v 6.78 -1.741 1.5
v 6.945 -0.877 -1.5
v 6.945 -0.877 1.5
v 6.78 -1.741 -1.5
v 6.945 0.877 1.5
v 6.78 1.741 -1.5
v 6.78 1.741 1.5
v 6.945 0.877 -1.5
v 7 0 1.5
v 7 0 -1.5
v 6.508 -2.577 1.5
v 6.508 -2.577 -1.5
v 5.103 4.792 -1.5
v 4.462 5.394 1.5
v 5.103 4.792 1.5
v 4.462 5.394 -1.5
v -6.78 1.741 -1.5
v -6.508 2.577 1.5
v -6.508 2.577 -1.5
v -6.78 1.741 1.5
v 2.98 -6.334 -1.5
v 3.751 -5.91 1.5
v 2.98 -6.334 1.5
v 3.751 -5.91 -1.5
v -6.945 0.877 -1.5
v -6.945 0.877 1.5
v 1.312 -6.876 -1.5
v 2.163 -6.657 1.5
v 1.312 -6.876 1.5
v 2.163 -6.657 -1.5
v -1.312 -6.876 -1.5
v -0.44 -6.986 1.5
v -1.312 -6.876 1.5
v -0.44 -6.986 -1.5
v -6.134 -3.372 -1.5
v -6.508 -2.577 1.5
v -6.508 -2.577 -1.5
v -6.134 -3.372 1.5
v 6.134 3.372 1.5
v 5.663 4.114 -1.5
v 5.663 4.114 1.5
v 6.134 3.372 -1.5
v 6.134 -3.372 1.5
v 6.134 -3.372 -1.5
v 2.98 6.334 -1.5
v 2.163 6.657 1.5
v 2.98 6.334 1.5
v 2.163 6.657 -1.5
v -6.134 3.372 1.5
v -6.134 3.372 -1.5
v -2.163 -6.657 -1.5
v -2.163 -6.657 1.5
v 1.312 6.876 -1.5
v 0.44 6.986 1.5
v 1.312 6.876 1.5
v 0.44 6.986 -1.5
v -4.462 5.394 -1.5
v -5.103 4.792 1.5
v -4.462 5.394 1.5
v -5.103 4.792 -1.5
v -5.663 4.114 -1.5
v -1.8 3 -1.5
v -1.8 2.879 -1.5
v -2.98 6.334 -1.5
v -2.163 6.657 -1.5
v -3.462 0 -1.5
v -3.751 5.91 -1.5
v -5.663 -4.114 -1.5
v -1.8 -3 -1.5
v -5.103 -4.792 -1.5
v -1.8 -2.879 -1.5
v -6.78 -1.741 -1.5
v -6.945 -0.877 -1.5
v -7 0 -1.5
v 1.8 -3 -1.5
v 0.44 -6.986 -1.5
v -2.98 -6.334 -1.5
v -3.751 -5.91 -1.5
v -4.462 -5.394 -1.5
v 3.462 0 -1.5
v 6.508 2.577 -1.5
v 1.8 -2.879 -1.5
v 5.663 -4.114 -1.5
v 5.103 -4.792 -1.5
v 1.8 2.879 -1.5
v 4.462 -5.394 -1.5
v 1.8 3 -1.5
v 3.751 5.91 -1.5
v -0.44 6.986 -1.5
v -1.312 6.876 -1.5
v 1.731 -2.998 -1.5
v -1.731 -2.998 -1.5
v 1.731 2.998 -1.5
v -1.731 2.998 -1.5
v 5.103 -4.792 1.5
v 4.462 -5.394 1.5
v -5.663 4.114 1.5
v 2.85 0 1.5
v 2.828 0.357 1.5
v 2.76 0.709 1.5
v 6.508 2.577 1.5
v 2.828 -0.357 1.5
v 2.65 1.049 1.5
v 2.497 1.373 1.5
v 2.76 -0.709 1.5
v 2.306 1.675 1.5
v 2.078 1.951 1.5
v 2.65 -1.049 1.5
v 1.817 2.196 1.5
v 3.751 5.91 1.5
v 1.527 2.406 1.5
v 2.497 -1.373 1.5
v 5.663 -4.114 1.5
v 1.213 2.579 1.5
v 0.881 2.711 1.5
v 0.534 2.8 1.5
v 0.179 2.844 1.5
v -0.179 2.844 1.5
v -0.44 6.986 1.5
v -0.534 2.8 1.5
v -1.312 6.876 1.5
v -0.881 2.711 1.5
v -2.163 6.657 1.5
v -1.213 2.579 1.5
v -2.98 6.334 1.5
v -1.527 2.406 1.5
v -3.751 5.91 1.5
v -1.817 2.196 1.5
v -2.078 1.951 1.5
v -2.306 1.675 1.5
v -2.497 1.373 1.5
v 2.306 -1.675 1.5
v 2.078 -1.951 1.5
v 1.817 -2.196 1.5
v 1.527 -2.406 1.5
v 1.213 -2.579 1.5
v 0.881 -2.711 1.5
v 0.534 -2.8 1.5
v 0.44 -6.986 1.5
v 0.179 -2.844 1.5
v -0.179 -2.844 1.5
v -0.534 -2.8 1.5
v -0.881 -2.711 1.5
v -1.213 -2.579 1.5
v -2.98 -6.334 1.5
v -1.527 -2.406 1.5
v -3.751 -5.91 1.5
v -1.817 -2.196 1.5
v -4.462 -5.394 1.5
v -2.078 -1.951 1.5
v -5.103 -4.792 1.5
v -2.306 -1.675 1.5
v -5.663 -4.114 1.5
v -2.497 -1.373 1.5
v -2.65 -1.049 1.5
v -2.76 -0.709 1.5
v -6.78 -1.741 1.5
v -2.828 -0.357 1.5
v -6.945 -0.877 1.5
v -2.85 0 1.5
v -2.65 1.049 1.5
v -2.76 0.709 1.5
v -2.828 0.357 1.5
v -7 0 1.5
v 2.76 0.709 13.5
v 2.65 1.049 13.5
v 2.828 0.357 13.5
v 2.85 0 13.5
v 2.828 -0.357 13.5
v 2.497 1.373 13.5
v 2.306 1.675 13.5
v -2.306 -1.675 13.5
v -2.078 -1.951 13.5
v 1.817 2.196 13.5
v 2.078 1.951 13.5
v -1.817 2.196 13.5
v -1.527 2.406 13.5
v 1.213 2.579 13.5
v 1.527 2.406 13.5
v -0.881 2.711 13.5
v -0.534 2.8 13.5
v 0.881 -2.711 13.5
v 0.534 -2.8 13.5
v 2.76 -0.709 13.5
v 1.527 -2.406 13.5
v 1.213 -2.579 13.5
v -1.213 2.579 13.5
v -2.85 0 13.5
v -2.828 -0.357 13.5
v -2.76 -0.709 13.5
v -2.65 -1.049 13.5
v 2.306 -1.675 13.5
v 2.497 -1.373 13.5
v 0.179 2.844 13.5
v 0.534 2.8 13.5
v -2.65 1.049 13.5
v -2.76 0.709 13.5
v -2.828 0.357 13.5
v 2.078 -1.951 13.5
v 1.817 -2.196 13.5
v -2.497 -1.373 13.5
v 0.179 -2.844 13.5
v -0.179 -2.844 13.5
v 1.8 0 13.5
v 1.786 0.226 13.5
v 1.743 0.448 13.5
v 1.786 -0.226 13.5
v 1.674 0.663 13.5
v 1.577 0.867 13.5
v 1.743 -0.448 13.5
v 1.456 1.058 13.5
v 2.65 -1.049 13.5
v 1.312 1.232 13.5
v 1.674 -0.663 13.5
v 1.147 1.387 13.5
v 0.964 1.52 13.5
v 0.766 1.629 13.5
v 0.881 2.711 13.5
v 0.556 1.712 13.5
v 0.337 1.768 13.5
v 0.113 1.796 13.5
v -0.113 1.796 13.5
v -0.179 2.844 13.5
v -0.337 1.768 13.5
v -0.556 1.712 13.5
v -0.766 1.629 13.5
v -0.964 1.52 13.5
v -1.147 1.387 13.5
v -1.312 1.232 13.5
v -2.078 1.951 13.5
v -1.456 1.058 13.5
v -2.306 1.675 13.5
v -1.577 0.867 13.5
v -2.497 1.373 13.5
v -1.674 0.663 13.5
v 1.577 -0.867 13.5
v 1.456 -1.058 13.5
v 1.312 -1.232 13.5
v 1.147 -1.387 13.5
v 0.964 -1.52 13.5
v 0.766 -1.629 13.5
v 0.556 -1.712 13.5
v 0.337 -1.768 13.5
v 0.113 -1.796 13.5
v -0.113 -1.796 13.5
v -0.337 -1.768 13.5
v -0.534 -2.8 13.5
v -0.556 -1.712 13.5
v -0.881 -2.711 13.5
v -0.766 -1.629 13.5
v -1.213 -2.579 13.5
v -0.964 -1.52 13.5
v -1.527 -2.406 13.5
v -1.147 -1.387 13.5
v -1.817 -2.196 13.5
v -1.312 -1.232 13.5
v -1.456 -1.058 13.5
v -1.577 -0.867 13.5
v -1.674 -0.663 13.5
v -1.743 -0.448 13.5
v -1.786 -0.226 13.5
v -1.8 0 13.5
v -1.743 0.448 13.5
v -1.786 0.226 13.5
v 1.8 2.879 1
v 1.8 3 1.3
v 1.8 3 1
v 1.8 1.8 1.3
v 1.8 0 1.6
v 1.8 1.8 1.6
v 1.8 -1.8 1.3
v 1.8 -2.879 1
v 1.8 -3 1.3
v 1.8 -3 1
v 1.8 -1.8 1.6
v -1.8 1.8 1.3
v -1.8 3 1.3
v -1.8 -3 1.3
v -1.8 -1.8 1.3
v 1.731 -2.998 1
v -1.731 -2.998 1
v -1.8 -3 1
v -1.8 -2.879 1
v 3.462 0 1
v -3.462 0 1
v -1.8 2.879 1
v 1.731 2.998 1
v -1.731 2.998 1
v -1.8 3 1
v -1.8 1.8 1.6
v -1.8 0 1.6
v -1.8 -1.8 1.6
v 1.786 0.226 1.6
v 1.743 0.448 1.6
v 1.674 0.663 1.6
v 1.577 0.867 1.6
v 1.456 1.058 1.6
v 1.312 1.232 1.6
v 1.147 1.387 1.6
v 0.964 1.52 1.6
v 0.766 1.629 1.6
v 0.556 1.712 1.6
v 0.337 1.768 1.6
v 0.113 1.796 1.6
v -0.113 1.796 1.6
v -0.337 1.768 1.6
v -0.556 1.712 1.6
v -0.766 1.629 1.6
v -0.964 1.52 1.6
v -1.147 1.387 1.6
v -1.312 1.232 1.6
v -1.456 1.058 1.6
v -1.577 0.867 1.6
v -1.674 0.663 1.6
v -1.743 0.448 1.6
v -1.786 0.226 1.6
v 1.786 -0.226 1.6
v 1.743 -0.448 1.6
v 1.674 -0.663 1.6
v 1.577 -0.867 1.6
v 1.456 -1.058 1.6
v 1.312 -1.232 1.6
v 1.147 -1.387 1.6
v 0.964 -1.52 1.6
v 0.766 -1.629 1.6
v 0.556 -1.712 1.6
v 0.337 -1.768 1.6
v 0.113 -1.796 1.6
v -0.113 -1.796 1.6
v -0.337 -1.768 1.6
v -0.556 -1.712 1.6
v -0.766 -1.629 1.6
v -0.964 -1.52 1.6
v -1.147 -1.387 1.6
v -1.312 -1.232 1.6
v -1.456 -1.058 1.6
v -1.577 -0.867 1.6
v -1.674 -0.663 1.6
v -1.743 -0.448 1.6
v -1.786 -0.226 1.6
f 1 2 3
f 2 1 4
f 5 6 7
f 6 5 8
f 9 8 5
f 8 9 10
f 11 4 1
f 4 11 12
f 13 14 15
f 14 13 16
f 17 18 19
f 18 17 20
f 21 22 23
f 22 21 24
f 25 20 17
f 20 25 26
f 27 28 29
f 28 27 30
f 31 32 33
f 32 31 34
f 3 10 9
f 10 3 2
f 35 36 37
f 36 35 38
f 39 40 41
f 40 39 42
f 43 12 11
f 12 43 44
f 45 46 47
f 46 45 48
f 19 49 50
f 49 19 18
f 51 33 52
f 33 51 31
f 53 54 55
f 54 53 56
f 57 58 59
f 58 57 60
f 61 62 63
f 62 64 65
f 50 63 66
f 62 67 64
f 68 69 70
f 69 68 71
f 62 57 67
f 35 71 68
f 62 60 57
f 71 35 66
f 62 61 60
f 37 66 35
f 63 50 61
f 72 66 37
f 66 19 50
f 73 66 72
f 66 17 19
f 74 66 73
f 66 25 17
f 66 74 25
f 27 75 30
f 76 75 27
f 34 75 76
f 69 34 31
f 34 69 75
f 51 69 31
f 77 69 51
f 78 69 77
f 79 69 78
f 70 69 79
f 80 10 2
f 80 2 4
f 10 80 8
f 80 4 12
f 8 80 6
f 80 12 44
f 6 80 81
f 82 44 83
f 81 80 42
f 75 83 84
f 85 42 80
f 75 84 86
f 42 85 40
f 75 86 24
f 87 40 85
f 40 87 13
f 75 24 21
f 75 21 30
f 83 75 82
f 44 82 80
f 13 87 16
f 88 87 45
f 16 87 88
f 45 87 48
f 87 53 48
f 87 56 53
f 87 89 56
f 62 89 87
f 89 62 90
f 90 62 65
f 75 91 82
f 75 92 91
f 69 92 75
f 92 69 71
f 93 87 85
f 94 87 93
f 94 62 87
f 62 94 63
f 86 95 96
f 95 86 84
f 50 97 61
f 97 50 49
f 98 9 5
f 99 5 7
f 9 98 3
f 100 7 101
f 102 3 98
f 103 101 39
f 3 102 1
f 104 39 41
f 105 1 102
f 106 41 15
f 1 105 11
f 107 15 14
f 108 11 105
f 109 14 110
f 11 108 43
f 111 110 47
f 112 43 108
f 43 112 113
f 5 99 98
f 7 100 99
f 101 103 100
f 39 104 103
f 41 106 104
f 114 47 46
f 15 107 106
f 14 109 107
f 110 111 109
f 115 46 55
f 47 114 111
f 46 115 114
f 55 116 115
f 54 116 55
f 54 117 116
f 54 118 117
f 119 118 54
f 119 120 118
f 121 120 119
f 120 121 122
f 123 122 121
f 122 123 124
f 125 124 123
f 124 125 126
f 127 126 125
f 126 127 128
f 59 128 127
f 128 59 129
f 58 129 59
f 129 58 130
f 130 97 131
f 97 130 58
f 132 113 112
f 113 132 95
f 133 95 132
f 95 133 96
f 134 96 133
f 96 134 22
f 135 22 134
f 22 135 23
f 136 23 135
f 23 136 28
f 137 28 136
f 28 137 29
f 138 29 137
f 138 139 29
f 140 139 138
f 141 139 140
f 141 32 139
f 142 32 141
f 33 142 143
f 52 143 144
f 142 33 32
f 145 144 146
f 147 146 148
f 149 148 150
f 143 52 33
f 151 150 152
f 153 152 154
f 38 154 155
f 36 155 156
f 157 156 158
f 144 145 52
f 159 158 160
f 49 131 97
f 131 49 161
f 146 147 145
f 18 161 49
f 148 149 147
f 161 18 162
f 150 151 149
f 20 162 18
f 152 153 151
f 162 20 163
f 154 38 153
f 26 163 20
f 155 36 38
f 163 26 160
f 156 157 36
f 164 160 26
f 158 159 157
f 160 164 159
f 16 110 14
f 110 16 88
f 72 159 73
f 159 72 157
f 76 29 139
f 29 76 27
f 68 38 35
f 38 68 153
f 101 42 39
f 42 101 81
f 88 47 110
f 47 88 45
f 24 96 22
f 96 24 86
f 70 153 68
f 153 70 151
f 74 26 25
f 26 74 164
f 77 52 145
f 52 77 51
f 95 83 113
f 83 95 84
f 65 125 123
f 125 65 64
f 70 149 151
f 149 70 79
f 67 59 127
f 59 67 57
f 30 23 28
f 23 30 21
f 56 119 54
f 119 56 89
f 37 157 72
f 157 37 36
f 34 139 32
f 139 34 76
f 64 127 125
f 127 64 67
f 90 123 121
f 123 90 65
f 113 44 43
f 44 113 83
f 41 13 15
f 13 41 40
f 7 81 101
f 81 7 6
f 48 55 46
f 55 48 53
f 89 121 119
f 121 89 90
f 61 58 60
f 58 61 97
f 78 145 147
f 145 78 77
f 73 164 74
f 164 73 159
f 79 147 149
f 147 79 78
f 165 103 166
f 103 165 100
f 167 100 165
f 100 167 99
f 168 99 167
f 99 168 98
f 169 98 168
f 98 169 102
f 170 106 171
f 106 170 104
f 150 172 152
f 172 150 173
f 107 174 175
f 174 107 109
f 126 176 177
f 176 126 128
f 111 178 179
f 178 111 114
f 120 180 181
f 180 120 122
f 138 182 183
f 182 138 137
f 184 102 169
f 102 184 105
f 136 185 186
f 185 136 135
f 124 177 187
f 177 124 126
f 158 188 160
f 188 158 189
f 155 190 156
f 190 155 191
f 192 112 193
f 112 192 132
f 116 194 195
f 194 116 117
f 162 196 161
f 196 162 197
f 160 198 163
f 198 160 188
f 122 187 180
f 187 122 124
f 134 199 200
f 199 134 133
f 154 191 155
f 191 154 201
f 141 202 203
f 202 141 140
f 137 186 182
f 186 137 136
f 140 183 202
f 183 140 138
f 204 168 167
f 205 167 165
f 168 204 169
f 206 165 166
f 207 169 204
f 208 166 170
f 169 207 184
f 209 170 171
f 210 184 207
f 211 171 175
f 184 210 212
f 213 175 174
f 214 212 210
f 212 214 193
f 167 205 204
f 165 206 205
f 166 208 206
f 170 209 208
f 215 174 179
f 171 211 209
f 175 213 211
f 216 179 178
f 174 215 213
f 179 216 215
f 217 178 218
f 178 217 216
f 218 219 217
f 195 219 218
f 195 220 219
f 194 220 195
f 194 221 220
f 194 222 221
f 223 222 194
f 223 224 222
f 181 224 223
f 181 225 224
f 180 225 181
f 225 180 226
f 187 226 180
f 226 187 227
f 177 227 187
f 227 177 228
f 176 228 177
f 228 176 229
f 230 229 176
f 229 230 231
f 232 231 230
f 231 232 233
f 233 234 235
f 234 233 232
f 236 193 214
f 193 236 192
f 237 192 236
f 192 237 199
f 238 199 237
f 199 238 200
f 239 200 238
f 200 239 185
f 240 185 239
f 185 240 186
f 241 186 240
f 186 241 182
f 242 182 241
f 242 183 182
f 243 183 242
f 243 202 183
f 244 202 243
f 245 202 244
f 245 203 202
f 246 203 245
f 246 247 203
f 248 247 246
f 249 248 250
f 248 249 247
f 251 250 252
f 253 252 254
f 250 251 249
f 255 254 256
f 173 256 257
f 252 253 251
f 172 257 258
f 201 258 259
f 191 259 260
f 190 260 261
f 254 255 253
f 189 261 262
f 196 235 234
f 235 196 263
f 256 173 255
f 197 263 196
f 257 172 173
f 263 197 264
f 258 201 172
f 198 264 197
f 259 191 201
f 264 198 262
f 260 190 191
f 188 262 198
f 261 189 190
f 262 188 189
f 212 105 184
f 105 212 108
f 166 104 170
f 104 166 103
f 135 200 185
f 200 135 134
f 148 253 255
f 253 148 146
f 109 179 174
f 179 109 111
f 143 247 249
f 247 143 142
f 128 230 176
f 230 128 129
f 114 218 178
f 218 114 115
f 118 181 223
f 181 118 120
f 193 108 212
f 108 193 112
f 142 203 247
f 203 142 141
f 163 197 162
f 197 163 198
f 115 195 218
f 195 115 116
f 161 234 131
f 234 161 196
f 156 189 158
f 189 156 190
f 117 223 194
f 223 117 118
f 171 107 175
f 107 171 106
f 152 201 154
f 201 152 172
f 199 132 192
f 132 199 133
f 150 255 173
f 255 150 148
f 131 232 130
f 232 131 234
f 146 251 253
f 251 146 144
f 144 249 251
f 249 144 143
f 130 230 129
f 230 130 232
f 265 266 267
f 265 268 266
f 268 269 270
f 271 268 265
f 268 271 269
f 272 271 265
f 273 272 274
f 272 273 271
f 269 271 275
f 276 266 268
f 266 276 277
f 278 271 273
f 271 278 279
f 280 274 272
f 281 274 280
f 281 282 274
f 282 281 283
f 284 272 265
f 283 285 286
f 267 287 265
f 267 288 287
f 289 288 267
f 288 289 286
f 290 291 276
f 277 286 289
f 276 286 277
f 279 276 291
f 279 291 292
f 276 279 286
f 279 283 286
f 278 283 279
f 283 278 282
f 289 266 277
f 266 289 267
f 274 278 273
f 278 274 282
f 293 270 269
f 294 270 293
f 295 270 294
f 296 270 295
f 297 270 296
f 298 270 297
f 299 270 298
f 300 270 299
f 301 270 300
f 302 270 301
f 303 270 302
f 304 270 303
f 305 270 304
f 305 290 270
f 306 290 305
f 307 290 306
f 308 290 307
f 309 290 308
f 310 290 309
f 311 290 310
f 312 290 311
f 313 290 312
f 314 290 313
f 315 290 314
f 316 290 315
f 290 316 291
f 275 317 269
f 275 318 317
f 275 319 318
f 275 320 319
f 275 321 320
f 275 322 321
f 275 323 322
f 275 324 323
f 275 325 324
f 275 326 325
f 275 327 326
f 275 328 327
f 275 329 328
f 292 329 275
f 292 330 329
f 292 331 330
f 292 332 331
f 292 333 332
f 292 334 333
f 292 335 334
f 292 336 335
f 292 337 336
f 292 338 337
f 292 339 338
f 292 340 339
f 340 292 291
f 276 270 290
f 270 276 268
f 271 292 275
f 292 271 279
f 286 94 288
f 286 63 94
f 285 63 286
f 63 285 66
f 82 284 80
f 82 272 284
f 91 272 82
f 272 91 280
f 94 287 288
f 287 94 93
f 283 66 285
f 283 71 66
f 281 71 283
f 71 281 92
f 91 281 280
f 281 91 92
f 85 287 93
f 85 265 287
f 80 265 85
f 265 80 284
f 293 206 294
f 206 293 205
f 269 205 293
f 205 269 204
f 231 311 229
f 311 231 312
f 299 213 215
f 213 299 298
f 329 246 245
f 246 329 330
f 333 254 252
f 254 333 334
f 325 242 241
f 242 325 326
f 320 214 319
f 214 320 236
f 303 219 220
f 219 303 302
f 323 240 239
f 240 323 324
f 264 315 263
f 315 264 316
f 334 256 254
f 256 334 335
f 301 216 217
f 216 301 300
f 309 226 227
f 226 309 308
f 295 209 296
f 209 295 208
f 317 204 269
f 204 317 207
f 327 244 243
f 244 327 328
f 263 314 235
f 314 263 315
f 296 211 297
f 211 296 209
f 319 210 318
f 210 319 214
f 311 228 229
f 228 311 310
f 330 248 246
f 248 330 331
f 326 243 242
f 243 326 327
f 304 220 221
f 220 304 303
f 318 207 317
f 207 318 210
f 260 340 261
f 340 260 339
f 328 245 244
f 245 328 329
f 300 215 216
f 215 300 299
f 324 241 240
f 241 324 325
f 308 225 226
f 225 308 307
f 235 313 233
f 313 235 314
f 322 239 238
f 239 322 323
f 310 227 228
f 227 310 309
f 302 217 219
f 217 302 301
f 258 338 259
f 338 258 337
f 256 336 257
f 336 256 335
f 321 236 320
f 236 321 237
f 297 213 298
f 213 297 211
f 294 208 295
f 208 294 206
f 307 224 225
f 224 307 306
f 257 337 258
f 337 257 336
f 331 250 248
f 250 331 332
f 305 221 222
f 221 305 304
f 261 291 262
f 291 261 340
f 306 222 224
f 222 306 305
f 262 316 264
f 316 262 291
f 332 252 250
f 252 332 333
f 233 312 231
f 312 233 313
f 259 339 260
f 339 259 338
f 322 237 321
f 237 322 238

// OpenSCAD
$fn = 50;


difference() {
	union() {
		translate(v = [0, 0, -1.5000000000]) {
			cylinder(h = 3, r = 7.0000000000);
		}
		translate(v = [0, 0, -1.5000000000]) {
			cylinder(h = 15, r = 2.8500000000);
		}
	}
	union() {
		translate(v = [0, 0, -1.5000000000]) {
			rotate(a = [0, 0, 0]) {
				difference() {
					union() {
						translate(v = [-1.8000000000, -3.0000000000, -0.3000000000]) {
							cube(size = [3.6000000000, 6.0000000000, 0.3000000000]);
						}
						translate(v = [-1.8000000000, -1.8000000000, -0.6000000000]) {
							cube(size = [3.6000000000, 3.6000000000, 0.3000000000]);
						}
						translate(v = [-1.8000000000, -3.0000000000, 2.5000000000]) {
							cube(size = [3.6000000000, 6.0000000000, 0.3000000000]);
						}
						translate(v = [-1.8000000000, -1.8000000000, 2.8000000000]) {
							cube(size = [3.6000000000, 3.6000000000, 0.3000000000]);
						}
						linear_extrude(height = 2.5000000000) {
							polygon(points = [[3.4620000000, 0.0000000000], [1.7310000000, 2.9981799479], [-1.7310000000, 2.9981799479], [-3.4620000000, 0.0000000000], [-1.7310000000, -2.9981799479], [1.7310000000, -2.9981799479]]);
						}
						translate(v = [-1.8000000000, -3.0000000000, -0.3000000000]) {
							cube(size = [3.6000000000, 6.0000000000, 0.3000000000]);
						}
						translate(v = [-1.8000000000, -1.8000000000, -0.6000000000]) {
							cube(size = [3.6000000000, 3.6000000000, 0.3000000000]);
						}
						translate(v = [-1.8000000000, -3.0000000000, 2.5000000000]) {
							cube(size = [3.6000000000, 6.0000000000, 0.3000000000]);
						}
						translate(v = [-1.8000000000, -1.8000000000, 2.8000000000]) {
							cube(size = [3.6000000000, 3.6000000000, 0.3000000000]);
						}
						translate(v = [-1.8000000000, -3.0000000000, -0.3000000000]) {
							cube(size = [3.6000000000, 6.0000000000, 0.3000000000]);
						}
						translate(v = [-1.8000000000, -1.8000000000, -0.6000000000]) {
							cube(size = [3.6000000000, 3.6000000000, 0.3000000000]);
						}
						translate(v = [-1.8000000000, -3.0000000000, 2.5000000000]) {
							cube(size = [3.6000000000, 6.0000000000, 0.3000000000]);
						}
						translate(v = [-1.8000000000, -1.8000000000, 2.8000000000]) {
							cube(size = [3.6000000000, 3.6000000000, 0.3000000000]);
						}
					}
					union();
				}
			}
		}
		translate(v = [0, 0, -50.0000000000]) {
			cylinder(h = 100, r = 1.8000000000);
		}
	}
}
